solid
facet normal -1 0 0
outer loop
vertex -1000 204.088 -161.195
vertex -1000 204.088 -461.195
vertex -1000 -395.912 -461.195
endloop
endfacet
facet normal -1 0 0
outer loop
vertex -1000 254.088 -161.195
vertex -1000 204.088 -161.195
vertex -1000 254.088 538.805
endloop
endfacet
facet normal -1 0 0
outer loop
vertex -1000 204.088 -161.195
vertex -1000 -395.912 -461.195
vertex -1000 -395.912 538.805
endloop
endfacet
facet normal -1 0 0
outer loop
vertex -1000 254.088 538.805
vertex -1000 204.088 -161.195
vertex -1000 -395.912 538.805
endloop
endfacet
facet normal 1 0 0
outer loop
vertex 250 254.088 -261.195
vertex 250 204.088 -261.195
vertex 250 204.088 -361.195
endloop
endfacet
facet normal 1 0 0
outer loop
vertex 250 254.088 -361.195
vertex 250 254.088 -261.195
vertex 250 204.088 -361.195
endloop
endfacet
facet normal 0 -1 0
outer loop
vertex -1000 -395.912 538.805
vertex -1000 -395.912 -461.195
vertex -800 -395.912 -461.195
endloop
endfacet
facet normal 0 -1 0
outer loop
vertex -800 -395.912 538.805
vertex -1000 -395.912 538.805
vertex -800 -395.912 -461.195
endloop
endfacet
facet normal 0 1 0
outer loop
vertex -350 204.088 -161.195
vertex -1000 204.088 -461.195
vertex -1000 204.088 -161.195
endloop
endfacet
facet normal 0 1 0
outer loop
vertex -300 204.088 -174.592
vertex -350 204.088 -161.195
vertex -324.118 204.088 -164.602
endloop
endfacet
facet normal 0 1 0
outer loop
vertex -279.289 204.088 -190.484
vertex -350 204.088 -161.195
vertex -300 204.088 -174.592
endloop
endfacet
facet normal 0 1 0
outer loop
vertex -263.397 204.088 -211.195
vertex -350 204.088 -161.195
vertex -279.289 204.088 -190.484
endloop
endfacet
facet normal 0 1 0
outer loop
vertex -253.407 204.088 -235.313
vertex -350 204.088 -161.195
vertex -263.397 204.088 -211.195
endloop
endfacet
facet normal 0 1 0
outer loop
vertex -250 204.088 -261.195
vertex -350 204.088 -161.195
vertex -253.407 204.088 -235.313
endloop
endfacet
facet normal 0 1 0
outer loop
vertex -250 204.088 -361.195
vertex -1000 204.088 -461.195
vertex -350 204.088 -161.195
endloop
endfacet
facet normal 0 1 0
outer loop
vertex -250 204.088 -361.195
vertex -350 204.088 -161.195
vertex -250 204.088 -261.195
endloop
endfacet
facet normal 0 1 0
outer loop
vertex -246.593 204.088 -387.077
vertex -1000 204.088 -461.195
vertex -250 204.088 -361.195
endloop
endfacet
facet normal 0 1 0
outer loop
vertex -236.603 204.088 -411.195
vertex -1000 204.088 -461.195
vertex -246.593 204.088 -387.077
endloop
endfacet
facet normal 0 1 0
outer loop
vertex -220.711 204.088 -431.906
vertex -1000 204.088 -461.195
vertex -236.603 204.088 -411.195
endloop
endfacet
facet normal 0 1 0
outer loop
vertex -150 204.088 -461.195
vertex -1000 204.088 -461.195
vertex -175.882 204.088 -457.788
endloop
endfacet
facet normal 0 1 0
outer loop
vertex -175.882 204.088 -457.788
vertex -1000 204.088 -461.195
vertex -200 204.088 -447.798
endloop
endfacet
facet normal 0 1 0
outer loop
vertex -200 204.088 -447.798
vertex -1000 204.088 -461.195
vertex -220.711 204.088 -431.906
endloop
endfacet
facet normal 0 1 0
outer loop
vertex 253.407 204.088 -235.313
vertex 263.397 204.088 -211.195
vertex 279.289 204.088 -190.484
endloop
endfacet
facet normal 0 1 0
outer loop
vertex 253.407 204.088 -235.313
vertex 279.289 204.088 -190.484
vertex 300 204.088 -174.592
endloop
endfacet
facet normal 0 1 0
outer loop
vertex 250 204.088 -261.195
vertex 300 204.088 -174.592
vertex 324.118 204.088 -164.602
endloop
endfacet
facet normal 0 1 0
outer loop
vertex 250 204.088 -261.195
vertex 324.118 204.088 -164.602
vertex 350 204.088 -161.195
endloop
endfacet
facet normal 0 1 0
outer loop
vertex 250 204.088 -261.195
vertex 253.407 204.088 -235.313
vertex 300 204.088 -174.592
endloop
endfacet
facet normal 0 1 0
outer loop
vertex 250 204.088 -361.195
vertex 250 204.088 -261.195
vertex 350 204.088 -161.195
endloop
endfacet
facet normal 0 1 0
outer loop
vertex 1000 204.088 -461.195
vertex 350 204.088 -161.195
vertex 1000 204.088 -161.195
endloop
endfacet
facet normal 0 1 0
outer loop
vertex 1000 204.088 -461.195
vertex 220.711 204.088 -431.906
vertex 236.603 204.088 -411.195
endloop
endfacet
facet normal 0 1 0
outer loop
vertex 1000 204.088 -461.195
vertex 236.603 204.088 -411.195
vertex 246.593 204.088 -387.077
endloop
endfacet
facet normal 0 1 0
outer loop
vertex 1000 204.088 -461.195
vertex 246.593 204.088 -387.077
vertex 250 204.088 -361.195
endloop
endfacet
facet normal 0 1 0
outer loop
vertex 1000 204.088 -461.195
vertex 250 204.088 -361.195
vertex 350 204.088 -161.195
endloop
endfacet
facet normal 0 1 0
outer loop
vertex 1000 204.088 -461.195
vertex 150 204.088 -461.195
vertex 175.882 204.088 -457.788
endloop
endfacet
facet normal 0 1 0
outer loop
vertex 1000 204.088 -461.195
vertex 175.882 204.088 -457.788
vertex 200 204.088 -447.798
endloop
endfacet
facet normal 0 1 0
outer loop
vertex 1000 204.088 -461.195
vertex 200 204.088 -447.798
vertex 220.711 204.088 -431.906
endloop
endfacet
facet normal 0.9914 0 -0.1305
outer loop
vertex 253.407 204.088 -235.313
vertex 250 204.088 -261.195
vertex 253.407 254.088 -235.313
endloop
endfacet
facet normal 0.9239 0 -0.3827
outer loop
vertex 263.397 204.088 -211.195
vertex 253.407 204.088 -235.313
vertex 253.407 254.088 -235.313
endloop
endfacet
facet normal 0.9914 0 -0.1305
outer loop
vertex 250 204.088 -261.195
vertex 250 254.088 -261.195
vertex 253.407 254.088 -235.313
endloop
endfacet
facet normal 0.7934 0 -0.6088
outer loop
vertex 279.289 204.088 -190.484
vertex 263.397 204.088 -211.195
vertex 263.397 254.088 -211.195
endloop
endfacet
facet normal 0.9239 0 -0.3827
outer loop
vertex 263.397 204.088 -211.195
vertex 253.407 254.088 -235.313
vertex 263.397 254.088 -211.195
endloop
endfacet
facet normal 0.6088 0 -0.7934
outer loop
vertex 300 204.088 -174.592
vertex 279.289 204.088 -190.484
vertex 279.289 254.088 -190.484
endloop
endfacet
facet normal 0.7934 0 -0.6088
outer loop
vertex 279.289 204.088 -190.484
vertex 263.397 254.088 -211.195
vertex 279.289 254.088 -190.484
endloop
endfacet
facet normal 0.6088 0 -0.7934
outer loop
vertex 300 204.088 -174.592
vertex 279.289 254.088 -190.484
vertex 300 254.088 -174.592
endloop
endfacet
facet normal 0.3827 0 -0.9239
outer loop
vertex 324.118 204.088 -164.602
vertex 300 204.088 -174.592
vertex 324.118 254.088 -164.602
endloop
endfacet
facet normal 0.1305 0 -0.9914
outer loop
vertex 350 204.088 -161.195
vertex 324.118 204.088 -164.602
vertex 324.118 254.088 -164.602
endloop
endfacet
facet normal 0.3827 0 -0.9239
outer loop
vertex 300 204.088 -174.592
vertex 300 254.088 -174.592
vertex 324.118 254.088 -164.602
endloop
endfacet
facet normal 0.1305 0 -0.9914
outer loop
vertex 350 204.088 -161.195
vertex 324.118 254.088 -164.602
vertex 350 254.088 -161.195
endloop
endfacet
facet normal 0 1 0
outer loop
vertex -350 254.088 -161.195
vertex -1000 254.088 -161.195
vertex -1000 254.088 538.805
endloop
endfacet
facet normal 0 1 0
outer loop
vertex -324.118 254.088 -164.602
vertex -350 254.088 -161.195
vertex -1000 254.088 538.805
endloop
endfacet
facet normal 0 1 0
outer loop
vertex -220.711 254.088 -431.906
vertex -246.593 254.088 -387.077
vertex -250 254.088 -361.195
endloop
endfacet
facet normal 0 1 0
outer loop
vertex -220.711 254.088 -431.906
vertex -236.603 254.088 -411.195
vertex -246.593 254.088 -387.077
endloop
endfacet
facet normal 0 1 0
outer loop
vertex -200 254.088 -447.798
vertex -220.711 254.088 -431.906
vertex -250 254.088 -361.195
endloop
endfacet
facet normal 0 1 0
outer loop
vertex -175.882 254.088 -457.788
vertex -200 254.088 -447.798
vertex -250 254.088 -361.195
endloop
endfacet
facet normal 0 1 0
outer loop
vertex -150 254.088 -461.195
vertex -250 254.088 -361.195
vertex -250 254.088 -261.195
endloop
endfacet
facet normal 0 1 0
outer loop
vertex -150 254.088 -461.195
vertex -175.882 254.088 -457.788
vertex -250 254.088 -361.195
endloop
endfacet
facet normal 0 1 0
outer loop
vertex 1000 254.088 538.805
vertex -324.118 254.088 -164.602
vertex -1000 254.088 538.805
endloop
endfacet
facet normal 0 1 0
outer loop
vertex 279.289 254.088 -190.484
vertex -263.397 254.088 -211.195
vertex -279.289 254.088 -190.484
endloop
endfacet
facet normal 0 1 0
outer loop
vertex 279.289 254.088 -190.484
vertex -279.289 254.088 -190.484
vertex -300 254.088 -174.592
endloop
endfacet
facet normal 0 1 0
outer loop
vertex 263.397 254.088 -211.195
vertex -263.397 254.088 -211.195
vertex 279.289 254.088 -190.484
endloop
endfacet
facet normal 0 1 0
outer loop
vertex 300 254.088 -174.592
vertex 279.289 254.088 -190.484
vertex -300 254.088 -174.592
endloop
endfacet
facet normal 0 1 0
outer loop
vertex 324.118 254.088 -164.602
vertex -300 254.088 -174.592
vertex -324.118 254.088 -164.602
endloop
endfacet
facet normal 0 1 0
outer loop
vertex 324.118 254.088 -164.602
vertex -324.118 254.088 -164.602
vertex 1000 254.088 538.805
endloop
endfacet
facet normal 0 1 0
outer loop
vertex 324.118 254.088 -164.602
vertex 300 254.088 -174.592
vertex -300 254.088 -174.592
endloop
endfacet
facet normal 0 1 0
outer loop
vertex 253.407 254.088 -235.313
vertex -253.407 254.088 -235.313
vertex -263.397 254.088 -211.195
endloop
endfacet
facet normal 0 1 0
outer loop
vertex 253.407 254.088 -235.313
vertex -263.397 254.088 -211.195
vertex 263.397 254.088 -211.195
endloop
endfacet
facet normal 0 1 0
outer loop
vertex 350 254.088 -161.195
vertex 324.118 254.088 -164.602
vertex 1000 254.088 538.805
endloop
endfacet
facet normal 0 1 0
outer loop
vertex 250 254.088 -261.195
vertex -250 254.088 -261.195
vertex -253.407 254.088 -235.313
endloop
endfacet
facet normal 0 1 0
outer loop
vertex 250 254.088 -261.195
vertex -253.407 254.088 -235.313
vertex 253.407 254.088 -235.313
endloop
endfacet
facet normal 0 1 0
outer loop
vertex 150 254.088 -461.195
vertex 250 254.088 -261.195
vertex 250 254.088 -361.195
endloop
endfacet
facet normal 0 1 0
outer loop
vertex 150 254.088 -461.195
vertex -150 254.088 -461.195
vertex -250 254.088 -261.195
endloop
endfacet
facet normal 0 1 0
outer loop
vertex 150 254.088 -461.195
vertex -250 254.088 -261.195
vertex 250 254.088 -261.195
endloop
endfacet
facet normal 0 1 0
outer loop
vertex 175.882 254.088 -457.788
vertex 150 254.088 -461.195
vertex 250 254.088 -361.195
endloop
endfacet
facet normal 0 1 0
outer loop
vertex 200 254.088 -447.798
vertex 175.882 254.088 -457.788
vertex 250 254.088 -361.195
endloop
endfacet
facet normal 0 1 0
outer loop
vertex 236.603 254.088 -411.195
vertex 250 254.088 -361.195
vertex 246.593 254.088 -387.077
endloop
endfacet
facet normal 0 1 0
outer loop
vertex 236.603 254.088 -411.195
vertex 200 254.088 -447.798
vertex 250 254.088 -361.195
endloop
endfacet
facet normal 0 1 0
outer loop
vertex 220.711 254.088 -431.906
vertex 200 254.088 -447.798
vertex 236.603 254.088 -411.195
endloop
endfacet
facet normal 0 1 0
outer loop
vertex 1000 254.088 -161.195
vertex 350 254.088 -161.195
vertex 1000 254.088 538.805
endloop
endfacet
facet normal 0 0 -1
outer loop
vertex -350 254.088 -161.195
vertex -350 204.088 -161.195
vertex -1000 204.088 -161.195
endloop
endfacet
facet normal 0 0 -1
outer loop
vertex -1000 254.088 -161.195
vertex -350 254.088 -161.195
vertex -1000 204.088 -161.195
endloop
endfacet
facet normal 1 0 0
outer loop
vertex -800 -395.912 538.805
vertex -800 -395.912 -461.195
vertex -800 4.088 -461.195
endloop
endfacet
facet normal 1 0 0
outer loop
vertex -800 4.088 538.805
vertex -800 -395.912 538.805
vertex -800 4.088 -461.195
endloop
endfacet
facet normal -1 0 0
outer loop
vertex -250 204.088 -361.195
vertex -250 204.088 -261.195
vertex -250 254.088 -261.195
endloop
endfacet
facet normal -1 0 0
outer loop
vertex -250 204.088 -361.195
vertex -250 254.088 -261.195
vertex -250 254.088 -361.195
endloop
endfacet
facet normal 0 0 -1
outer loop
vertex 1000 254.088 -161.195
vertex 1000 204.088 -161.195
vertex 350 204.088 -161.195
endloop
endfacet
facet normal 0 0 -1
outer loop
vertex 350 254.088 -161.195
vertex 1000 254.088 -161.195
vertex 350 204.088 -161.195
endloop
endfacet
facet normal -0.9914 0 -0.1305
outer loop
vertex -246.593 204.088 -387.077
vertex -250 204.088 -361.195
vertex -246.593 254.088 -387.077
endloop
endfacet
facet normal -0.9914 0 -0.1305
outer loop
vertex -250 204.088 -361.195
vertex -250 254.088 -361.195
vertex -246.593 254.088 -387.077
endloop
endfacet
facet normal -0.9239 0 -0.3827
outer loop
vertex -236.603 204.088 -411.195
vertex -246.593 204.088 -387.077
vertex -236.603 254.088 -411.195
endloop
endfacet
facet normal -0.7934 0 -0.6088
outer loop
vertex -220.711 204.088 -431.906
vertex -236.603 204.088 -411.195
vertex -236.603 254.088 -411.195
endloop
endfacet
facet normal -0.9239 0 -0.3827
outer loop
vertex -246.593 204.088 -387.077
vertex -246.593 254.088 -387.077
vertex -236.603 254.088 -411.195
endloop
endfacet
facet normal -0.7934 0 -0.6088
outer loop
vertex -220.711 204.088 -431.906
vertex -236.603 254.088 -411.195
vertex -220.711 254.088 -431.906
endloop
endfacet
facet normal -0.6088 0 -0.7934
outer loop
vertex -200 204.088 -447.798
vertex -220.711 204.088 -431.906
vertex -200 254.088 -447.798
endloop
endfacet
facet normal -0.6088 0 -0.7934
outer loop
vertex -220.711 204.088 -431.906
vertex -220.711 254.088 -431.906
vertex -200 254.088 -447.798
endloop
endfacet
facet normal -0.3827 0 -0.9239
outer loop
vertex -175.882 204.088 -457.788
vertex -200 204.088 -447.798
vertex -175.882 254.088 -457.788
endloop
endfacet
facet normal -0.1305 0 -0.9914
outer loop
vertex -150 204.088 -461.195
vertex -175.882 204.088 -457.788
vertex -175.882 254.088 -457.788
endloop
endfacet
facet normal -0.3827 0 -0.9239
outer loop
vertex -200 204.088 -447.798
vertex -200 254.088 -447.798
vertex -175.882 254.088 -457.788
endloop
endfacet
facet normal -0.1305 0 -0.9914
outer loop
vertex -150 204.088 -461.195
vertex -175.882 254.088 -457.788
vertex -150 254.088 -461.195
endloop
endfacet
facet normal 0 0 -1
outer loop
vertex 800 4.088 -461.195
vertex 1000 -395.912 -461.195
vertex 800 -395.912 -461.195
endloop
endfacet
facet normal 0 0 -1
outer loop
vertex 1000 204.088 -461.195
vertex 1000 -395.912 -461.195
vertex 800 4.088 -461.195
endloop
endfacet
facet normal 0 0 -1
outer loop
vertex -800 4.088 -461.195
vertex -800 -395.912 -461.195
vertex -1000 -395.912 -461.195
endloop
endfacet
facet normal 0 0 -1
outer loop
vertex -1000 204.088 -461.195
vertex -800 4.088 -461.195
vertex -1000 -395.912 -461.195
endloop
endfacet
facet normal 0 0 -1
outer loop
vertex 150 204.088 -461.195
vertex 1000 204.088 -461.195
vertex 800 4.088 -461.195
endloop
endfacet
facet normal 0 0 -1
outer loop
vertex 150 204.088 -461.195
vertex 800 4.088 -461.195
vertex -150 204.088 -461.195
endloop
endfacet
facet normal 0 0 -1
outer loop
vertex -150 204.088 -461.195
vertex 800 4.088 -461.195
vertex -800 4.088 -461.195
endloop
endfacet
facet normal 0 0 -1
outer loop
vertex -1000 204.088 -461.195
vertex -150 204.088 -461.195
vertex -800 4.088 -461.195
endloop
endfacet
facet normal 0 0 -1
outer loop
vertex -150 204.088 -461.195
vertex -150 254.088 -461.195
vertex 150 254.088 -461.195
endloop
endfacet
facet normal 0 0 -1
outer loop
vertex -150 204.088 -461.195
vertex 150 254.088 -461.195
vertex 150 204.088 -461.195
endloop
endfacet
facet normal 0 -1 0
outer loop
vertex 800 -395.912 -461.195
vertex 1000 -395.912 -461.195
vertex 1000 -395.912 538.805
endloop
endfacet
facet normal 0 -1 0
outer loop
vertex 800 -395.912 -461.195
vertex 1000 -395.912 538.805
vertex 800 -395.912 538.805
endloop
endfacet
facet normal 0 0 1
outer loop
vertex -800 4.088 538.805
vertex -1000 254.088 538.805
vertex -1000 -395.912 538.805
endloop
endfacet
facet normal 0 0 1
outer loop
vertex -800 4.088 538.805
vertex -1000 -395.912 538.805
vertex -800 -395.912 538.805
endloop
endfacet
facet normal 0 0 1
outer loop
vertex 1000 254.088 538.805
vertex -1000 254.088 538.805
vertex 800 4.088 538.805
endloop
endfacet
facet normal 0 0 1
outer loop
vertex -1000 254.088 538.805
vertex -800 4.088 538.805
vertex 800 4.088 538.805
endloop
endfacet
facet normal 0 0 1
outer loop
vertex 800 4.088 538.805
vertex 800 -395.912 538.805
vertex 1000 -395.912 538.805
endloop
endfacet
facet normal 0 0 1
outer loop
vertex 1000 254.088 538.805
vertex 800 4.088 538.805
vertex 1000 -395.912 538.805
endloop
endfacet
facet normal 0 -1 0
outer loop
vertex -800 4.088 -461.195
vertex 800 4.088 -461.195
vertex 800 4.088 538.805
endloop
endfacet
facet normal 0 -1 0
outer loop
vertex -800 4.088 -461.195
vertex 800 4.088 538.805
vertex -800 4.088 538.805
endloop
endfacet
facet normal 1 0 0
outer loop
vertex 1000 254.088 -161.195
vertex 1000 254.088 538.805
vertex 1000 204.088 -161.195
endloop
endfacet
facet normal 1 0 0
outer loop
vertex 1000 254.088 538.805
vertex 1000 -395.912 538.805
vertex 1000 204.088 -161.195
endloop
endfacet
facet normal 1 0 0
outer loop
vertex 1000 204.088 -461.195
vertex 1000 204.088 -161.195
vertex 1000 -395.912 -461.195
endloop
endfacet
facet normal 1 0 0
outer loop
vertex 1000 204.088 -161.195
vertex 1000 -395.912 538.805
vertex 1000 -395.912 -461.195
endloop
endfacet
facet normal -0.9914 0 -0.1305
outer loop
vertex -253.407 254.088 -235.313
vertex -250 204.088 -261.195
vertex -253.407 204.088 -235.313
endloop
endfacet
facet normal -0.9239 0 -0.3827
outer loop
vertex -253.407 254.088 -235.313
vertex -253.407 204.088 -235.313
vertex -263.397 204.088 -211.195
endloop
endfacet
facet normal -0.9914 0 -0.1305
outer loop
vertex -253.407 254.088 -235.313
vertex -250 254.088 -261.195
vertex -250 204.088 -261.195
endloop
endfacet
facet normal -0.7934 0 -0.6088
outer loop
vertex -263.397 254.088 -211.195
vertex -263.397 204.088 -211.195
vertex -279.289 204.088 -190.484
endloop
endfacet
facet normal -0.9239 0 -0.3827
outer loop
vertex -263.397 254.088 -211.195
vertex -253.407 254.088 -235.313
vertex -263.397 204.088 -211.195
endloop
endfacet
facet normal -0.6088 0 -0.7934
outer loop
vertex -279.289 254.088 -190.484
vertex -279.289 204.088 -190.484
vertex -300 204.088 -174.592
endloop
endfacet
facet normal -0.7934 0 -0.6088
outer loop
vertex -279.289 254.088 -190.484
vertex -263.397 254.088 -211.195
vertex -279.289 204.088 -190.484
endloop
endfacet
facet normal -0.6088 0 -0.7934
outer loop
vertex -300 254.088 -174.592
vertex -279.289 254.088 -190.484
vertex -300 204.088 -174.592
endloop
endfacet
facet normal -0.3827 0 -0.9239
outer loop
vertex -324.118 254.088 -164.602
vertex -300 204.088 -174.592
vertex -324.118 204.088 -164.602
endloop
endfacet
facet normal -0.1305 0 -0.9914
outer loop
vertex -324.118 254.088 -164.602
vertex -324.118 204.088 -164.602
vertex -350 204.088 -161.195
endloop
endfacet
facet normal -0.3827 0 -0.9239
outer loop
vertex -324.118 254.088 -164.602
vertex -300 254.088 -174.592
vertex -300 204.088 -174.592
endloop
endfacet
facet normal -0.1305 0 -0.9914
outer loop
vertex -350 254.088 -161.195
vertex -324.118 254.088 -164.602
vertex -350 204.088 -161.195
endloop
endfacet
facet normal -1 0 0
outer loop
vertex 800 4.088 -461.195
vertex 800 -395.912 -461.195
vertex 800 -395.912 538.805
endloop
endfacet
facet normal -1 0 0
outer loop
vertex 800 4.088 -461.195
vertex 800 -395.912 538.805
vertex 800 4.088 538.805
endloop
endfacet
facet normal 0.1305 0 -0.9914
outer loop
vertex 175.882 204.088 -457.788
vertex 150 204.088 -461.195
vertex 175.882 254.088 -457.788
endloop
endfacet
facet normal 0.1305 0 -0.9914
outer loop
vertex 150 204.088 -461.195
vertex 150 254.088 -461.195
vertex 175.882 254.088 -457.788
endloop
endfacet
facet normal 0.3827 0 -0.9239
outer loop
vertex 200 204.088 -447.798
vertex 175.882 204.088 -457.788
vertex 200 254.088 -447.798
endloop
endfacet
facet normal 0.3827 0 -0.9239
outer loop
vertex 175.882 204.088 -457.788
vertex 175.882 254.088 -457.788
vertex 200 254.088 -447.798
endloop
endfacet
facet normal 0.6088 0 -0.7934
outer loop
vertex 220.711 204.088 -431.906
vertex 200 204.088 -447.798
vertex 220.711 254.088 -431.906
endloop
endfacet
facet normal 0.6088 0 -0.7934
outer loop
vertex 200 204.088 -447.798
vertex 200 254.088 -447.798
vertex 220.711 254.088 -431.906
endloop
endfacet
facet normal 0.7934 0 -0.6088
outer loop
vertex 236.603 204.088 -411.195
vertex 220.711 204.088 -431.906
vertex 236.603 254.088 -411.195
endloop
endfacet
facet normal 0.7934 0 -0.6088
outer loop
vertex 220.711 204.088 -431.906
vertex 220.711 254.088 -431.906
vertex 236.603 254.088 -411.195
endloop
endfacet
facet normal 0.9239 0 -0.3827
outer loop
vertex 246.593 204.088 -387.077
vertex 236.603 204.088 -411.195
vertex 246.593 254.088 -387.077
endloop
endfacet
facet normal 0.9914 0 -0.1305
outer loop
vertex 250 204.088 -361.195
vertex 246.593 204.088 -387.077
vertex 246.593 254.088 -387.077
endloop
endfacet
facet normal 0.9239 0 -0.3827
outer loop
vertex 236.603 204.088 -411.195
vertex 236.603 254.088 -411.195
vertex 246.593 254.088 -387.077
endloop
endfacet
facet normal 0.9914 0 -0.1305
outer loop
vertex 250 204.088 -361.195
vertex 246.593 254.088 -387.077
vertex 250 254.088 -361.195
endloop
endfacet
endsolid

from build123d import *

# Parameters (mm, degrees)
BOSS_EXTRUDE1_DEPTH = 100
SKETCH2_W           = 50
SKETCH2_H           = 30
BOSS_EXTRUDE2_DEPTH = 5
FILLET1_R           = 10
SCALE1_SCALE        = 10


with BuildPart() as part:
    # Sketch1 → Boss-Extrude1 (new body)
    with BuildSketch(Plane.XY):
        Polygon((0, 60), (-100, 60), (-100, 0), (-80, 0), (-80, 40), (0, 40), align=None)
    boss_extrude1 = extrude(amount=BOSS_EXTRUDE1_DEPTH)

    # Mirror1: Boss-Extrude1 across plane
    add(boss_extrude1.mirror(Plane(origin=(0, 40, 100), x_dir=(0, 0, 1), z_dir=(-1, 0, 0))))

    # Sketch2 → Boss-Extrude2 (add)
    with BuildSketch(Plane(origin=(0, 60, 0), x_dir=(1, 0, 0), z_dir=(0, 1, 0))):
        Polygon((-100, -30), (-100, -100), (100, -100), (100, -30), (25, -30), (-25, -30), align=None)
        with Locations((0, -15)):
            Rectangle(SKETCH2_W, SKETCH2_H)
    extrude(amount=BOSS_EXTRUDE2_DEPTH)

    # Fillet1
    fillet1_edges = [part.edges().sort_by_distance(p)[0] for p in [
        (-25, 62.5, 30),
        (25, 62.5, 30),
        (25, 62.5, 0),
        (-25, 62.5, 0),
    ]]
    fillet(fillet1_edges, radius=FILLET1_R)


with BuildPart() as part_1:
    # Scale1: scaled about (0, 43.990196078, 51.243889179)
    add(part.part.scale(SCALE1_SCALE).moved(Location((0, -395.911764702, -461.195002611))))


solid = part_1.part
